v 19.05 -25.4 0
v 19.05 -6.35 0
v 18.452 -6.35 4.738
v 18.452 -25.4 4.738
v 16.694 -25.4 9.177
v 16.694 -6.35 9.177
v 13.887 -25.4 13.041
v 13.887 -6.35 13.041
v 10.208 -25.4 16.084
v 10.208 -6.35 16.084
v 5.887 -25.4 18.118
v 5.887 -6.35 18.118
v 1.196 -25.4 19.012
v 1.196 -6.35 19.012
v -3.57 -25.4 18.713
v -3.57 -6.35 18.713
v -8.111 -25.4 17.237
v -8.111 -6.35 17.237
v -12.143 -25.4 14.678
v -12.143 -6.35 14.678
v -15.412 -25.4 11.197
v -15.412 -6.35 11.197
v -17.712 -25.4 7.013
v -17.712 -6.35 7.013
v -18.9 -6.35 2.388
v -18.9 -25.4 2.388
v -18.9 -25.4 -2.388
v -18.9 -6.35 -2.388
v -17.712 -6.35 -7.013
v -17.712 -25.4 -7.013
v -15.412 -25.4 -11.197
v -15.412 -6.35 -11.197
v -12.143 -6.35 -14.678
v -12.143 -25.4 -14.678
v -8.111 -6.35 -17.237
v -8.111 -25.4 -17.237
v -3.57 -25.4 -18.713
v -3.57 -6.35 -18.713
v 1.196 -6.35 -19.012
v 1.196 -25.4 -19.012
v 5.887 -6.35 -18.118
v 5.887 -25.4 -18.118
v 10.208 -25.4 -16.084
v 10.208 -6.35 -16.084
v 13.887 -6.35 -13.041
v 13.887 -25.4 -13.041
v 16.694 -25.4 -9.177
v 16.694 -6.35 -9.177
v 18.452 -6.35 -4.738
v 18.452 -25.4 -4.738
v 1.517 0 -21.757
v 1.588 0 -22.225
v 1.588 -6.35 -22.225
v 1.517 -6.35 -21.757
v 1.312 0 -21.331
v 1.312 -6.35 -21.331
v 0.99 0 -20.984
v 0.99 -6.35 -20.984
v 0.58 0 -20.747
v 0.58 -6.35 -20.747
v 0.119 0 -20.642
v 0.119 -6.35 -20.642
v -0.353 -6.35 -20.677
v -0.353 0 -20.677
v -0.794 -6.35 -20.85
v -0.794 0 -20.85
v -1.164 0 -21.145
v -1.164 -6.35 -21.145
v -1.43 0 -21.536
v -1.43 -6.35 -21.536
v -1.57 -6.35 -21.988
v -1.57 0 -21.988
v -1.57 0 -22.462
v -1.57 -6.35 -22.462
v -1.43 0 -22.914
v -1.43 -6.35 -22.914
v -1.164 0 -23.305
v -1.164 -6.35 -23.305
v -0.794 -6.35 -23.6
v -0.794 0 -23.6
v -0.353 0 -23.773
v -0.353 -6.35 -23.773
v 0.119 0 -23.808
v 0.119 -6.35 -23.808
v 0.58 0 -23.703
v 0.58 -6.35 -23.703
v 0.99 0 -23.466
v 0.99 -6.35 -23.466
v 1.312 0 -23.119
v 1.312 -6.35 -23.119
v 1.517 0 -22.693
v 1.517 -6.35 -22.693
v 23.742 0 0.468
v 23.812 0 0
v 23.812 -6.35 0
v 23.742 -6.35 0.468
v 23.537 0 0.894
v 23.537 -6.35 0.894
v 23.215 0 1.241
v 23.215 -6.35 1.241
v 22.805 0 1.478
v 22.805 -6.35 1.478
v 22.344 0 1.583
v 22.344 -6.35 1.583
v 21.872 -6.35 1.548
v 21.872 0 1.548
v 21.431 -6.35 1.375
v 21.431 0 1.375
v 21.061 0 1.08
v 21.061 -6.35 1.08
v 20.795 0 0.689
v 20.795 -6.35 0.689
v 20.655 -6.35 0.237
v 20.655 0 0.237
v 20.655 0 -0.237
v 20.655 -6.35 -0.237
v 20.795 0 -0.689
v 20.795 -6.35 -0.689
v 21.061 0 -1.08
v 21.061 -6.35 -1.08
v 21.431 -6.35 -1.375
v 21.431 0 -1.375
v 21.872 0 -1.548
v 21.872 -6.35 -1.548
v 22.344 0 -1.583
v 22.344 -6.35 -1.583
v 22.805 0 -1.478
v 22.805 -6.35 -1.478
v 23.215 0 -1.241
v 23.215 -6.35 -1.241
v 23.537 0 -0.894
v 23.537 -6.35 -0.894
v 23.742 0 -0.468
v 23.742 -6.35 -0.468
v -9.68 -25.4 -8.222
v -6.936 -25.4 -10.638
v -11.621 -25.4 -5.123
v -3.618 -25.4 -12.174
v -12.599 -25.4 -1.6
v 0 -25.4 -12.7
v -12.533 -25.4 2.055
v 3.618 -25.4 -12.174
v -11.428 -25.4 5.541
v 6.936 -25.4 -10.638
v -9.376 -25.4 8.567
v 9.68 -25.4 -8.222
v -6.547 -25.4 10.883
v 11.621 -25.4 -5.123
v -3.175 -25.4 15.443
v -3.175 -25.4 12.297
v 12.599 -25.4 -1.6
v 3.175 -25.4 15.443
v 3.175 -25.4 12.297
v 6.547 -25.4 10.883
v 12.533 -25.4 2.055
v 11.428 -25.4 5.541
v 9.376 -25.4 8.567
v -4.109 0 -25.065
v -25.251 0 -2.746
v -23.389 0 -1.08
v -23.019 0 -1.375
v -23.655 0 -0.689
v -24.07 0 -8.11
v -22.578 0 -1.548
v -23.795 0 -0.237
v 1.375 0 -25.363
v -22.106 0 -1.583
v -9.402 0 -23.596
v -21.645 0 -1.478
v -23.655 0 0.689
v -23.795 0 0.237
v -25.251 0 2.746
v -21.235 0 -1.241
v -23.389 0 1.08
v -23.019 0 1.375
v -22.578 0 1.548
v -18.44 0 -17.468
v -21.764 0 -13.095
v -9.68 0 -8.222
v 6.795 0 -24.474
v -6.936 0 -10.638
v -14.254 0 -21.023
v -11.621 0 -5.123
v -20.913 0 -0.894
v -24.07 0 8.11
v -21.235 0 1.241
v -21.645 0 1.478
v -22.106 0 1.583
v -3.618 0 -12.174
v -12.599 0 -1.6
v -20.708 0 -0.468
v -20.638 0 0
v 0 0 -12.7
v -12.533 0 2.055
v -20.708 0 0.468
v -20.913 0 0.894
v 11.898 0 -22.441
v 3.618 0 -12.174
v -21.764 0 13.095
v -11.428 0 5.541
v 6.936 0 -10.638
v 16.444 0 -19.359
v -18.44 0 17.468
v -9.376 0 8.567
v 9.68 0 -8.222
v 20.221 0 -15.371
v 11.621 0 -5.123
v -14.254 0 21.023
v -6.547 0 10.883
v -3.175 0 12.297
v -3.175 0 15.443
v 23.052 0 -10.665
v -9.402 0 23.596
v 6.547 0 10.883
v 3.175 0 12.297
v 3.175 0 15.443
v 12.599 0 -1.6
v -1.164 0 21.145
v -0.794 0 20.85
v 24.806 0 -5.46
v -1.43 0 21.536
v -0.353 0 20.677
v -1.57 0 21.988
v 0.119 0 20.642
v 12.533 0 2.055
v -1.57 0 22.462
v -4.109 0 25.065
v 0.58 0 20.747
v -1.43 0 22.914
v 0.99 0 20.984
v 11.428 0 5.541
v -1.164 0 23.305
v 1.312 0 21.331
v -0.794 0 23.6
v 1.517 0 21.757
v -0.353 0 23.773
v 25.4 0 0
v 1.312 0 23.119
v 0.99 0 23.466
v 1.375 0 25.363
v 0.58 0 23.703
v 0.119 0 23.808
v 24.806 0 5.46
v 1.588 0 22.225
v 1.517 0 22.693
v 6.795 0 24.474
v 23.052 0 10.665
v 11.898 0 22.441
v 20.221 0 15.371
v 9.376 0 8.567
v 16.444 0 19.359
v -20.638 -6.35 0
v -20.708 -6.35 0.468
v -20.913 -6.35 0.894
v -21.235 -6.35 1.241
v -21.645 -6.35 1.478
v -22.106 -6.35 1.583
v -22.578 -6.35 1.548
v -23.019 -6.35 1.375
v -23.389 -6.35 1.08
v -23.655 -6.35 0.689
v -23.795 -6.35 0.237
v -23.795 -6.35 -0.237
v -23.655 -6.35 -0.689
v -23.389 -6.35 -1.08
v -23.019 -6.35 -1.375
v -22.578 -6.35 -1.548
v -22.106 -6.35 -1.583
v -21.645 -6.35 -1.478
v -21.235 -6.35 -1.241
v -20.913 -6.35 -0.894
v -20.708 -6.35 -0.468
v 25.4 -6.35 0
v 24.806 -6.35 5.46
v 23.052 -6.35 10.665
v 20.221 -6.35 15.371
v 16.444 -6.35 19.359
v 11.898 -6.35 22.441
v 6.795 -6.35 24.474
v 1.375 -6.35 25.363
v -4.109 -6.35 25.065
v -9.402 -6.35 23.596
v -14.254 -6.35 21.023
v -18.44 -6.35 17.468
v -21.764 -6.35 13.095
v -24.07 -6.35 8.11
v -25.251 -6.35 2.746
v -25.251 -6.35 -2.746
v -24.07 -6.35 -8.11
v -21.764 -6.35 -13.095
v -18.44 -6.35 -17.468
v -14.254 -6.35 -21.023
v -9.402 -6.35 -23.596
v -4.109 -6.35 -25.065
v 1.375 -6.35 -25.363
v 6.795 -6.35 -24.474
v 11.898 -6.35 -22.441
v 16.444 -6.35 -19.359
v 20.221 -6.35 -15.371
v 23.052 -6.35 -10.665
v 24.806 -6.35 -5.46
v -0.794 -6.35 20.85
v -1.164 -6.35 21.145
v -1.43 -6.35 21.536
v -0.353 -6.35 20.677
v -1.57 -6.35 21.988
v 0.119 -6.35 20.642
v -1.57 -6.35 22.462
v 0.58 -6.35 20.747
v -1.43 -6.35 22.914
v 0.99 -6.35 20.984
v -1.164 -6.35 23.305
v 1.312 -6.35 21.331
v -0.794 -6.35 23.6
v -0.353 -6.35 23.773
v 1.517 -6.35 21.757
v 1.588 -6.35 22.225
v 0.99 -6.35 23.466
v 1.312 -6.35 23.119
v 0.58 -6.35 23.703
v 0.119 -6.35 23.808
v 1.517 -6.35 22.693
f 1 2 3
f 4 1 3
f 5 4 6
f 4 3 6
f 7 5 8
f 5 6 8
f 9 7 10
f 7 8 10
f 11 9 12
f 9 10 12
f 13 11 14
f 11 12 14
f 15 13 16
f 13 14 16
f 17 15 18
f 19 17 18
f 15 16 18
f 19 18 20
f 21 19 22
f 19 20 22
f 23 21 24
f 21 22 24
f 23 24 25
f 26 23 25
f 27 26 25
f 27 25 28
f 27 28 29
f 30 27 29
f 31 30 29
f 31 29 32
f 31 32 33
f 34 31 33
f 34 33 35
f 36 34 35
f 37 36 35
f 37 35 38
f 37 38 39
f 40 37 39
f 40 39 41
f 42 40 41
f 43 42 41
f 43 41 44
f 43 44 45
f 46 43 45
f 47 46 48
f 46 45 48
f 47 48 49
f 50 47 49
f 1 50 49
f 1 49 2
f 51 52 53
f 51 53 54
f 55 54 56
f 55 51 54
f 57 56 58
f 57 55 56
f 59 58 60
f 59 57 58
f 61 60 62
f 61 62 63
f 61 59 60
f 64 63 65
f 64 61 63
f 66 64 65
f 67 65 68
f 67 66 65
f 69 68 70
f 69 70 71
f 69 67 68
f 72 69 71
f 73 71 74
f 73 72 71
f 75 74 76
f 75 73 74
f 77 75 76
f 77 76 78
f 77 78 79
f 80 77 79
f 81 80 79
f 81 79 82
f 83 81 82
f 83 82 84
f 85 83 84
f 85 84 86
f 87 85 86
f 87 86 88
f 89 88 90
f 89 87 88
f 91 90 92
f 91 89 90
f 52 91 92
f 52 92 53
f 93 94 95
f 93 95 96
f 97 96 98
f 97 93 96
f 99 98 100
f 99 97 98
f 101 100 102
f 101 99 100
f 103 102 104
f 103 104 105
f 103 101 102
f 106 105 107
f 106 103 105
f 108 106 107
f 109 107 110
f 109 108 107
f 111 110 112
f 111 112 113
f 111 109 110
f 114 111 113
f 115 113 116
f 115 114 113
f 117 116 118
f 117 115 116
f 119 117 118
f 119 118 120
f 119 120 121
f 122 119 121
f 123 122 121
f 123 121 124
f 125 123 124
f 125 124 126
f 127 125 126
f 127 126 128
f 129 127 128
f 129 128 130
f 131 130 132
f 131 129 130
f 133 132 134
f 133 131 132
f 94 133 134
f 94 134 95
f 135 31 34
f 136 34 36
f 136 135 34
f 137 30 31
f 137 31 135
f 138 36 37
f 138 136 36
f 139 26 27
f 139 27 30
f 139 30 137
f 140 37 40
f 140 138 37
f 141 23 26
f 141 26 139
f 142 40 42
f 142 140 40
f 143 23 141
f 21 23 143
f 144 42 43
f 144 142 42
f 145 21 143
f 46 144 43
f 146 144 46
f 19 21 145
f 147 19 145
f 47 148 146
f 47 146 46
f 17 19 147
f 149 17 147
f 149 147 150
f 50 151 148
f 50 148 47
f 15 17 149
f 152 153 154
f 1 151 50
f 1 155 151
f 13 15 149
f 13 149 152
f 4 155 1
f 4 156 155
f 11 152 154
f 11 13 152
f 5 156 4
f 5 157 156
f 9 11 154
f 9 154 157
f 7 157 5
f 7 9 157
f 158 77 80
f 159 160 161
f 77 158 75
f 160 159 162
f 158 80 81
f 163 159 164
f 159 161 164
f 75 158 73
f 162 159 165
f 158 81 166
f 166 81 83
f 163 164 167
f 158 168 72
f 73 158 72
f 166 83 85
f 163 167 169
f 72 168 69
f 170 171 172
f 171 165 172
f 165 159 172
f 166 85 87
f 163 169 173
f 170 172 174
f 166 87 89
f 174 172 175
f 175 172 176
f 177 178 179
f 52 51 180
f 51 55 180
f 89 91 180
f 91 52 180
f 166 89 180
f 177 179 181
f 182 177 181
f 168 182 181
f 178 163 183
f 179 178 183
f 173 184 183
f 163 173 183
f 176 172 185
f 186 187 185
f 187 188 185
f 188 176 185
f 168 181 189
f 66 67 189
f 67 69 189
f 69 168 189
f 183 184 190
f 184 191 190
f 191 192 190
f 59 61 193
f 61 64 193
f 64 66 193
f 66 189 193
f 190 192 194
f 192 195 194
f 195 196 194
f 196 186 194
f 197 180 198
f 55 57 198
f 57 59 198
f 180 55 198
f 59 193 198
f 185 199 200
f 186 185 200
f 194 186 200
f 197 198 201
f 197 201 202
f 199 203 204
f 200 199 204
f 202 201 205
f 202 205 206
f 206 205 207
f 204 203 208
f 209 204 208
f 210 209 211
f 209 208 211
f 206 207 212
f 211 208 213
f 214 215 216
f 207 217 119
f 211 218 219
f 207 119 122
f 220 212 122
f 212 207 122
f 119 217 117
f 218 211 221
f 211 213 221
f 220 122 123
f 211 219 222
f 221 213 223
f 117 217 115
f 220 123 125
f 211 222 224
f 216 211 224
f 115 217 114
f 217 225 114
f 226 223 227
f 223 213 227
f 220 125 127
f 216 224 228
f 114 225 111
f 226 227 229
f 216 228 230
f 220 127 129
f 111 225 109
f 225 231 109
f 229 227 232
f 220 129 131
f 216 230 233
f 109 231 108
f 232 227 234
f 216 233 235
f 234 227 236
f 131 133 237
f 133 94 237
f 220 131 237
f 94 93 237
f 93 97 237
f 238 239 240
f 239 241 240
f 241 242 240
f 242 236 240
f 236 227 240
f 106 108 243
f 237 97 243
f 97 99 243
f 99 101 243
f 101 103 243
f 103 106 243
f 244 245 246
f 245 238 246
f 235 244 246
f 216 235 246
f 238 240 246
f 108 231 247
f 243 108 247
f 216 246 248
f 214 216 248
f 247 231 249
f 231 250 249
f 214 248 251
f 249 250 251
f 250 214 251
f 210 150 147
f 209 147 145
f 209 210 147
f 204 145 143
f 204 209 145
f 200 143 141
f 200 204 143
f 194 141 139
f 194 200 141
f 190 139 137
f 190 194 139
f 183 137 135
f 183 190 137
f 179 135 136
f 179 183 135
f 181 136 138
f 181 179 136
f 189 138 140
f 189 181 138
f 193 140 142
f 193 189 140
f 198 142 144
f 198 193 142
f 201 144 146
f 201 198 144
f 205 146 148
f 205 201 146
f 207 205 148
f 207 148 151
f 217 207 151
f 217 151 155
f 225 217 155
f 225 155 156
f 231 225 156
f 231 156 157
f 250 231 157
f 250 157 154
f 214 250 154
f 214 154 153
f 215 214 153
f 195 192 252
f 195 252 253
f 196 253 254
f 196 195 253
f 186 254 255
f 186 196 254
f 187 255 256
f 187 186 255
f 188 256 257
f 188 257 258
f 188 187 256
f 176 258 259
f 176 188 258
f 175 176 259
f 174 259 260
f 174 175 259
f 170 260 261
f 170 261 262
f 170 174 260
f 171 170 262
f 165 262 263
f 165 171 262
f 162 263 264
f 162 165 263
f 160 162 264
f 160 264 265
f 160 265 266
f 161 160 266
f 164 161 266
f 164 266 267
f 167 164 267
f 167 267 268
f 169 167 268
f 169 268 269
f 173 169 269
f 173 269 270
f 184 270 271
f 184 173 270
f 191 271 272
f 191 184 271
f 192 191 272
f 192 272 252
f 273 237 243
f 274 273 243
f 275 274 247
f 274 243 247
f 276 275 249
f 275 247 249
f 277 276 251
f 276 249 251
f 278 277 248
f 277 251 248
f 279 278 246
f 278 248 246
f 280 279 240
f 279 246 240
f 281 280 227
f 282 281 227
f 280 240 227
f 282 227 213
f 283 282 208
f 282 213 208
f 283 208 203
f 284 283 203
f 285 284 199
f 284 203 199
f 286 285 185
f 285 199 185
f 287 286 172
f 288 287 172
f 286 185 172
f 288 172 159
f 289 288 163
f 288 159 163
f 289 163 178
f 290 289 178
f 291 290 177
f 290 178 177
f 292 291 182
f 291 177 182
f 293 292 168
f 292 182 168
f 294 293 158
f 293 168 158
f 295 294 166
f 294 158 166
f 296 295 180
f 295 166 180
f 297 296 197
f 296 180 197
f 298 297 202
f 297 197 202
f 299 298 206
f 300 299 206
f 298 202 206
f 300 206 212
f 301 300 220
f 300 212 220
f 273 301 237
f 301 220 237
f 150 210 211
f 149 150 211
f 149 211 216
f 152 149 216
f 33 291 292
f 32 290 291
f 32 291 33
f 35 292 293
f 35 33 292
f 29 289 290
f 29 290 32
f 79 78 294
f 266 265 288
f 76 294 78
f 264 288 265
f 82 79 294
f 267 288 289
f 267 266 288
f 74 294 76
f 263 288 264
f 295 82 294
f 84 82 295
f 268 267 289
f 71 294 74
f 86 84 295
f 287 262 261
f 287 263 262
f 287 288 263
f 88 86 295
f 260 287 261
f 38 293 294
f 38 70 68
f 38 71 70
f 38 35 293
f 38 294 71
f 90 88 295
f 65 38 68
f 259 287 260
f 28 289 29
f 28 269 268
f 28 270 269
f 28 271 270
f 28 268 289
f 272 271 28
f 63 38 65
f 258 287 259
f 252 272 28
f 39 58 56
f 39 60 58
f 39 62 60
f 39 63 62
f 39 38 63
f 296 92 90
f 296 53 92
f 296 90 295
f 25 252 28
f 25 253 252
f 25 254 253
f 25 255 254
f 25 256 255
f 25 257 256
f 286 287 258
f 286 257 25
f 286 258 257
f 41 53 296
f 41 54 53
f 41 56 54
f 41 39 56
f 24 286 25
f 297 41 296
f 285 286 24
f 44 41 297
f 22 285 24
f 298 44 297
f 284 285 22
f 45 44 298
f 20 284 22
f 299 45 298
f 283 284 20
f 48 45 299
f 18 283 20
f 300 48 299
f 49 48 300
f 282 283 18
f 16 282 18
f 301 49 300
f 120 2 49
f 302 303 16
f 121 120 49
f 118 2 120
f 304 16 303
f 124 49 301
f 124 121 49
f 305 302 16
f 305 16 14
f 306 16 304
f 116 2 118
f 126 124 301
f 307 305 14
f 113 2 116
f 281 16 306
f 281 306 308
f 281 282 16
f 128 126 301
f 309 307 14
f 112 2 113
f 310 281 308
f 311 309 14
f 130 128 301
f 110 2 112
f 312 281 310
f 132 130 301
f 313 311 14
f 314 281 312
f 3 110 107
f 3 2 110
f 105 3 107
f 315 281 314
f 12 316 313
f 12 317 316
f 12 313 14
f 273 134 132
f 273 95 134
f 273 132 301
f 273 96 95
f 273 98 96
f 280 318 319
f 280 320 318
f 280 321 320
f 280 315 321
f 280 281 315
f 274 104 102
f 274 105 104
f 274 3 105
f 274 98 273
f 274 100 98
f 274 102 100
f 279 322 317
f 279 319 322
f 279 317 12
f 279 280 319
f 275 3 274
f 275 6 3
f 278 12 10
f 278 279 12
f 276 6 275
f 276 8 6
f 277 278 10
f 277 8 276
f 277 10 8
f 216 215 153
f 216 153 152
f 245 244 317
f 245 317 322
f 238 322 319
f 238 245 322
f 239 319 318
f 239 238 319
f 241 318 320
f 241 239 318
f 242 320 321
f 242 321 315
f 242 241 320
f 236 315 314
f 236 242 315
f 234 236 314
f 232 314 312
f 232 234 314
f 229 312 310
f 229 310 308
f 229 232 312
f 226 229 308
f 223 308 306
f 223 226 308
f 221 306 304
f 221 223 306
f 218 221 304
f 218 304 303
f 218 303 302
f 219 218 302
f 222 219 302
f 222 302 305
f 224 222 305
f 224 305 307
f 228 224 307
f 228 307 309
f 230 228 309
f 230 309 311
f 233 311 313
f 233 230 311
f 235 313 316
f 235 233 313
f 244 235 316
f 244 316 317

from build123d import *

# Parameters (mm, degrees)
F0_R     = 25.4
F0_R_2   = 1.5875
F0_R_3   = 12.7
F1_DEPTH = 6.35
F2_R     = 19.05
F2_R_2   = 12.7
F3_DEPTH = 25.4
F4_W     = 6.35
F4_H     = 15.4432
F5_DEPTH = 25.401


with BuildPart() as f1:
    # F0 (on Front) → F1 (new body)
    with BuildSketch(Plane.XZ):
        Circle(F0_R)
        with Locations((0, -22.225)):
            Circle(F0_R_2, mode=Mode.SUBTRACT)
        with Locations((-22.225, 0)):
            Circle(F0_R_2, mode=Mode.SUBTRACT)
        Circle(F0_R_3, mode=Mode.SUBTRACT)
        with Locations((22.225, 0)):
            Circle(F0_R_2, mode=Mode.SUBTRACT)
        with Locations((0, 22.225)):
            Circle(F0_R_2, mode=Mode.SUBTRACT)
    extrude(amount=F1_DEPTH)

    # F2 (on Front) → F3 (join)
    with BuildSketch(Plane.XZ):
        Circle(F2_R)
        Circle(F2_R_2, mode=Mode.SUBTRACT)
    extrude(amount=F3_DEPTH)

    # F4 (on Front) → F5 (cut, through all)
    with BuildSketch(Plane.XZ):
        with Locations((0, 7.7216)):
            Rectangle(F4_W, F4_H)
    extrude(amount=F5_DEPTH, mode=Mode.SUBTRACT)


solid = f1.part
